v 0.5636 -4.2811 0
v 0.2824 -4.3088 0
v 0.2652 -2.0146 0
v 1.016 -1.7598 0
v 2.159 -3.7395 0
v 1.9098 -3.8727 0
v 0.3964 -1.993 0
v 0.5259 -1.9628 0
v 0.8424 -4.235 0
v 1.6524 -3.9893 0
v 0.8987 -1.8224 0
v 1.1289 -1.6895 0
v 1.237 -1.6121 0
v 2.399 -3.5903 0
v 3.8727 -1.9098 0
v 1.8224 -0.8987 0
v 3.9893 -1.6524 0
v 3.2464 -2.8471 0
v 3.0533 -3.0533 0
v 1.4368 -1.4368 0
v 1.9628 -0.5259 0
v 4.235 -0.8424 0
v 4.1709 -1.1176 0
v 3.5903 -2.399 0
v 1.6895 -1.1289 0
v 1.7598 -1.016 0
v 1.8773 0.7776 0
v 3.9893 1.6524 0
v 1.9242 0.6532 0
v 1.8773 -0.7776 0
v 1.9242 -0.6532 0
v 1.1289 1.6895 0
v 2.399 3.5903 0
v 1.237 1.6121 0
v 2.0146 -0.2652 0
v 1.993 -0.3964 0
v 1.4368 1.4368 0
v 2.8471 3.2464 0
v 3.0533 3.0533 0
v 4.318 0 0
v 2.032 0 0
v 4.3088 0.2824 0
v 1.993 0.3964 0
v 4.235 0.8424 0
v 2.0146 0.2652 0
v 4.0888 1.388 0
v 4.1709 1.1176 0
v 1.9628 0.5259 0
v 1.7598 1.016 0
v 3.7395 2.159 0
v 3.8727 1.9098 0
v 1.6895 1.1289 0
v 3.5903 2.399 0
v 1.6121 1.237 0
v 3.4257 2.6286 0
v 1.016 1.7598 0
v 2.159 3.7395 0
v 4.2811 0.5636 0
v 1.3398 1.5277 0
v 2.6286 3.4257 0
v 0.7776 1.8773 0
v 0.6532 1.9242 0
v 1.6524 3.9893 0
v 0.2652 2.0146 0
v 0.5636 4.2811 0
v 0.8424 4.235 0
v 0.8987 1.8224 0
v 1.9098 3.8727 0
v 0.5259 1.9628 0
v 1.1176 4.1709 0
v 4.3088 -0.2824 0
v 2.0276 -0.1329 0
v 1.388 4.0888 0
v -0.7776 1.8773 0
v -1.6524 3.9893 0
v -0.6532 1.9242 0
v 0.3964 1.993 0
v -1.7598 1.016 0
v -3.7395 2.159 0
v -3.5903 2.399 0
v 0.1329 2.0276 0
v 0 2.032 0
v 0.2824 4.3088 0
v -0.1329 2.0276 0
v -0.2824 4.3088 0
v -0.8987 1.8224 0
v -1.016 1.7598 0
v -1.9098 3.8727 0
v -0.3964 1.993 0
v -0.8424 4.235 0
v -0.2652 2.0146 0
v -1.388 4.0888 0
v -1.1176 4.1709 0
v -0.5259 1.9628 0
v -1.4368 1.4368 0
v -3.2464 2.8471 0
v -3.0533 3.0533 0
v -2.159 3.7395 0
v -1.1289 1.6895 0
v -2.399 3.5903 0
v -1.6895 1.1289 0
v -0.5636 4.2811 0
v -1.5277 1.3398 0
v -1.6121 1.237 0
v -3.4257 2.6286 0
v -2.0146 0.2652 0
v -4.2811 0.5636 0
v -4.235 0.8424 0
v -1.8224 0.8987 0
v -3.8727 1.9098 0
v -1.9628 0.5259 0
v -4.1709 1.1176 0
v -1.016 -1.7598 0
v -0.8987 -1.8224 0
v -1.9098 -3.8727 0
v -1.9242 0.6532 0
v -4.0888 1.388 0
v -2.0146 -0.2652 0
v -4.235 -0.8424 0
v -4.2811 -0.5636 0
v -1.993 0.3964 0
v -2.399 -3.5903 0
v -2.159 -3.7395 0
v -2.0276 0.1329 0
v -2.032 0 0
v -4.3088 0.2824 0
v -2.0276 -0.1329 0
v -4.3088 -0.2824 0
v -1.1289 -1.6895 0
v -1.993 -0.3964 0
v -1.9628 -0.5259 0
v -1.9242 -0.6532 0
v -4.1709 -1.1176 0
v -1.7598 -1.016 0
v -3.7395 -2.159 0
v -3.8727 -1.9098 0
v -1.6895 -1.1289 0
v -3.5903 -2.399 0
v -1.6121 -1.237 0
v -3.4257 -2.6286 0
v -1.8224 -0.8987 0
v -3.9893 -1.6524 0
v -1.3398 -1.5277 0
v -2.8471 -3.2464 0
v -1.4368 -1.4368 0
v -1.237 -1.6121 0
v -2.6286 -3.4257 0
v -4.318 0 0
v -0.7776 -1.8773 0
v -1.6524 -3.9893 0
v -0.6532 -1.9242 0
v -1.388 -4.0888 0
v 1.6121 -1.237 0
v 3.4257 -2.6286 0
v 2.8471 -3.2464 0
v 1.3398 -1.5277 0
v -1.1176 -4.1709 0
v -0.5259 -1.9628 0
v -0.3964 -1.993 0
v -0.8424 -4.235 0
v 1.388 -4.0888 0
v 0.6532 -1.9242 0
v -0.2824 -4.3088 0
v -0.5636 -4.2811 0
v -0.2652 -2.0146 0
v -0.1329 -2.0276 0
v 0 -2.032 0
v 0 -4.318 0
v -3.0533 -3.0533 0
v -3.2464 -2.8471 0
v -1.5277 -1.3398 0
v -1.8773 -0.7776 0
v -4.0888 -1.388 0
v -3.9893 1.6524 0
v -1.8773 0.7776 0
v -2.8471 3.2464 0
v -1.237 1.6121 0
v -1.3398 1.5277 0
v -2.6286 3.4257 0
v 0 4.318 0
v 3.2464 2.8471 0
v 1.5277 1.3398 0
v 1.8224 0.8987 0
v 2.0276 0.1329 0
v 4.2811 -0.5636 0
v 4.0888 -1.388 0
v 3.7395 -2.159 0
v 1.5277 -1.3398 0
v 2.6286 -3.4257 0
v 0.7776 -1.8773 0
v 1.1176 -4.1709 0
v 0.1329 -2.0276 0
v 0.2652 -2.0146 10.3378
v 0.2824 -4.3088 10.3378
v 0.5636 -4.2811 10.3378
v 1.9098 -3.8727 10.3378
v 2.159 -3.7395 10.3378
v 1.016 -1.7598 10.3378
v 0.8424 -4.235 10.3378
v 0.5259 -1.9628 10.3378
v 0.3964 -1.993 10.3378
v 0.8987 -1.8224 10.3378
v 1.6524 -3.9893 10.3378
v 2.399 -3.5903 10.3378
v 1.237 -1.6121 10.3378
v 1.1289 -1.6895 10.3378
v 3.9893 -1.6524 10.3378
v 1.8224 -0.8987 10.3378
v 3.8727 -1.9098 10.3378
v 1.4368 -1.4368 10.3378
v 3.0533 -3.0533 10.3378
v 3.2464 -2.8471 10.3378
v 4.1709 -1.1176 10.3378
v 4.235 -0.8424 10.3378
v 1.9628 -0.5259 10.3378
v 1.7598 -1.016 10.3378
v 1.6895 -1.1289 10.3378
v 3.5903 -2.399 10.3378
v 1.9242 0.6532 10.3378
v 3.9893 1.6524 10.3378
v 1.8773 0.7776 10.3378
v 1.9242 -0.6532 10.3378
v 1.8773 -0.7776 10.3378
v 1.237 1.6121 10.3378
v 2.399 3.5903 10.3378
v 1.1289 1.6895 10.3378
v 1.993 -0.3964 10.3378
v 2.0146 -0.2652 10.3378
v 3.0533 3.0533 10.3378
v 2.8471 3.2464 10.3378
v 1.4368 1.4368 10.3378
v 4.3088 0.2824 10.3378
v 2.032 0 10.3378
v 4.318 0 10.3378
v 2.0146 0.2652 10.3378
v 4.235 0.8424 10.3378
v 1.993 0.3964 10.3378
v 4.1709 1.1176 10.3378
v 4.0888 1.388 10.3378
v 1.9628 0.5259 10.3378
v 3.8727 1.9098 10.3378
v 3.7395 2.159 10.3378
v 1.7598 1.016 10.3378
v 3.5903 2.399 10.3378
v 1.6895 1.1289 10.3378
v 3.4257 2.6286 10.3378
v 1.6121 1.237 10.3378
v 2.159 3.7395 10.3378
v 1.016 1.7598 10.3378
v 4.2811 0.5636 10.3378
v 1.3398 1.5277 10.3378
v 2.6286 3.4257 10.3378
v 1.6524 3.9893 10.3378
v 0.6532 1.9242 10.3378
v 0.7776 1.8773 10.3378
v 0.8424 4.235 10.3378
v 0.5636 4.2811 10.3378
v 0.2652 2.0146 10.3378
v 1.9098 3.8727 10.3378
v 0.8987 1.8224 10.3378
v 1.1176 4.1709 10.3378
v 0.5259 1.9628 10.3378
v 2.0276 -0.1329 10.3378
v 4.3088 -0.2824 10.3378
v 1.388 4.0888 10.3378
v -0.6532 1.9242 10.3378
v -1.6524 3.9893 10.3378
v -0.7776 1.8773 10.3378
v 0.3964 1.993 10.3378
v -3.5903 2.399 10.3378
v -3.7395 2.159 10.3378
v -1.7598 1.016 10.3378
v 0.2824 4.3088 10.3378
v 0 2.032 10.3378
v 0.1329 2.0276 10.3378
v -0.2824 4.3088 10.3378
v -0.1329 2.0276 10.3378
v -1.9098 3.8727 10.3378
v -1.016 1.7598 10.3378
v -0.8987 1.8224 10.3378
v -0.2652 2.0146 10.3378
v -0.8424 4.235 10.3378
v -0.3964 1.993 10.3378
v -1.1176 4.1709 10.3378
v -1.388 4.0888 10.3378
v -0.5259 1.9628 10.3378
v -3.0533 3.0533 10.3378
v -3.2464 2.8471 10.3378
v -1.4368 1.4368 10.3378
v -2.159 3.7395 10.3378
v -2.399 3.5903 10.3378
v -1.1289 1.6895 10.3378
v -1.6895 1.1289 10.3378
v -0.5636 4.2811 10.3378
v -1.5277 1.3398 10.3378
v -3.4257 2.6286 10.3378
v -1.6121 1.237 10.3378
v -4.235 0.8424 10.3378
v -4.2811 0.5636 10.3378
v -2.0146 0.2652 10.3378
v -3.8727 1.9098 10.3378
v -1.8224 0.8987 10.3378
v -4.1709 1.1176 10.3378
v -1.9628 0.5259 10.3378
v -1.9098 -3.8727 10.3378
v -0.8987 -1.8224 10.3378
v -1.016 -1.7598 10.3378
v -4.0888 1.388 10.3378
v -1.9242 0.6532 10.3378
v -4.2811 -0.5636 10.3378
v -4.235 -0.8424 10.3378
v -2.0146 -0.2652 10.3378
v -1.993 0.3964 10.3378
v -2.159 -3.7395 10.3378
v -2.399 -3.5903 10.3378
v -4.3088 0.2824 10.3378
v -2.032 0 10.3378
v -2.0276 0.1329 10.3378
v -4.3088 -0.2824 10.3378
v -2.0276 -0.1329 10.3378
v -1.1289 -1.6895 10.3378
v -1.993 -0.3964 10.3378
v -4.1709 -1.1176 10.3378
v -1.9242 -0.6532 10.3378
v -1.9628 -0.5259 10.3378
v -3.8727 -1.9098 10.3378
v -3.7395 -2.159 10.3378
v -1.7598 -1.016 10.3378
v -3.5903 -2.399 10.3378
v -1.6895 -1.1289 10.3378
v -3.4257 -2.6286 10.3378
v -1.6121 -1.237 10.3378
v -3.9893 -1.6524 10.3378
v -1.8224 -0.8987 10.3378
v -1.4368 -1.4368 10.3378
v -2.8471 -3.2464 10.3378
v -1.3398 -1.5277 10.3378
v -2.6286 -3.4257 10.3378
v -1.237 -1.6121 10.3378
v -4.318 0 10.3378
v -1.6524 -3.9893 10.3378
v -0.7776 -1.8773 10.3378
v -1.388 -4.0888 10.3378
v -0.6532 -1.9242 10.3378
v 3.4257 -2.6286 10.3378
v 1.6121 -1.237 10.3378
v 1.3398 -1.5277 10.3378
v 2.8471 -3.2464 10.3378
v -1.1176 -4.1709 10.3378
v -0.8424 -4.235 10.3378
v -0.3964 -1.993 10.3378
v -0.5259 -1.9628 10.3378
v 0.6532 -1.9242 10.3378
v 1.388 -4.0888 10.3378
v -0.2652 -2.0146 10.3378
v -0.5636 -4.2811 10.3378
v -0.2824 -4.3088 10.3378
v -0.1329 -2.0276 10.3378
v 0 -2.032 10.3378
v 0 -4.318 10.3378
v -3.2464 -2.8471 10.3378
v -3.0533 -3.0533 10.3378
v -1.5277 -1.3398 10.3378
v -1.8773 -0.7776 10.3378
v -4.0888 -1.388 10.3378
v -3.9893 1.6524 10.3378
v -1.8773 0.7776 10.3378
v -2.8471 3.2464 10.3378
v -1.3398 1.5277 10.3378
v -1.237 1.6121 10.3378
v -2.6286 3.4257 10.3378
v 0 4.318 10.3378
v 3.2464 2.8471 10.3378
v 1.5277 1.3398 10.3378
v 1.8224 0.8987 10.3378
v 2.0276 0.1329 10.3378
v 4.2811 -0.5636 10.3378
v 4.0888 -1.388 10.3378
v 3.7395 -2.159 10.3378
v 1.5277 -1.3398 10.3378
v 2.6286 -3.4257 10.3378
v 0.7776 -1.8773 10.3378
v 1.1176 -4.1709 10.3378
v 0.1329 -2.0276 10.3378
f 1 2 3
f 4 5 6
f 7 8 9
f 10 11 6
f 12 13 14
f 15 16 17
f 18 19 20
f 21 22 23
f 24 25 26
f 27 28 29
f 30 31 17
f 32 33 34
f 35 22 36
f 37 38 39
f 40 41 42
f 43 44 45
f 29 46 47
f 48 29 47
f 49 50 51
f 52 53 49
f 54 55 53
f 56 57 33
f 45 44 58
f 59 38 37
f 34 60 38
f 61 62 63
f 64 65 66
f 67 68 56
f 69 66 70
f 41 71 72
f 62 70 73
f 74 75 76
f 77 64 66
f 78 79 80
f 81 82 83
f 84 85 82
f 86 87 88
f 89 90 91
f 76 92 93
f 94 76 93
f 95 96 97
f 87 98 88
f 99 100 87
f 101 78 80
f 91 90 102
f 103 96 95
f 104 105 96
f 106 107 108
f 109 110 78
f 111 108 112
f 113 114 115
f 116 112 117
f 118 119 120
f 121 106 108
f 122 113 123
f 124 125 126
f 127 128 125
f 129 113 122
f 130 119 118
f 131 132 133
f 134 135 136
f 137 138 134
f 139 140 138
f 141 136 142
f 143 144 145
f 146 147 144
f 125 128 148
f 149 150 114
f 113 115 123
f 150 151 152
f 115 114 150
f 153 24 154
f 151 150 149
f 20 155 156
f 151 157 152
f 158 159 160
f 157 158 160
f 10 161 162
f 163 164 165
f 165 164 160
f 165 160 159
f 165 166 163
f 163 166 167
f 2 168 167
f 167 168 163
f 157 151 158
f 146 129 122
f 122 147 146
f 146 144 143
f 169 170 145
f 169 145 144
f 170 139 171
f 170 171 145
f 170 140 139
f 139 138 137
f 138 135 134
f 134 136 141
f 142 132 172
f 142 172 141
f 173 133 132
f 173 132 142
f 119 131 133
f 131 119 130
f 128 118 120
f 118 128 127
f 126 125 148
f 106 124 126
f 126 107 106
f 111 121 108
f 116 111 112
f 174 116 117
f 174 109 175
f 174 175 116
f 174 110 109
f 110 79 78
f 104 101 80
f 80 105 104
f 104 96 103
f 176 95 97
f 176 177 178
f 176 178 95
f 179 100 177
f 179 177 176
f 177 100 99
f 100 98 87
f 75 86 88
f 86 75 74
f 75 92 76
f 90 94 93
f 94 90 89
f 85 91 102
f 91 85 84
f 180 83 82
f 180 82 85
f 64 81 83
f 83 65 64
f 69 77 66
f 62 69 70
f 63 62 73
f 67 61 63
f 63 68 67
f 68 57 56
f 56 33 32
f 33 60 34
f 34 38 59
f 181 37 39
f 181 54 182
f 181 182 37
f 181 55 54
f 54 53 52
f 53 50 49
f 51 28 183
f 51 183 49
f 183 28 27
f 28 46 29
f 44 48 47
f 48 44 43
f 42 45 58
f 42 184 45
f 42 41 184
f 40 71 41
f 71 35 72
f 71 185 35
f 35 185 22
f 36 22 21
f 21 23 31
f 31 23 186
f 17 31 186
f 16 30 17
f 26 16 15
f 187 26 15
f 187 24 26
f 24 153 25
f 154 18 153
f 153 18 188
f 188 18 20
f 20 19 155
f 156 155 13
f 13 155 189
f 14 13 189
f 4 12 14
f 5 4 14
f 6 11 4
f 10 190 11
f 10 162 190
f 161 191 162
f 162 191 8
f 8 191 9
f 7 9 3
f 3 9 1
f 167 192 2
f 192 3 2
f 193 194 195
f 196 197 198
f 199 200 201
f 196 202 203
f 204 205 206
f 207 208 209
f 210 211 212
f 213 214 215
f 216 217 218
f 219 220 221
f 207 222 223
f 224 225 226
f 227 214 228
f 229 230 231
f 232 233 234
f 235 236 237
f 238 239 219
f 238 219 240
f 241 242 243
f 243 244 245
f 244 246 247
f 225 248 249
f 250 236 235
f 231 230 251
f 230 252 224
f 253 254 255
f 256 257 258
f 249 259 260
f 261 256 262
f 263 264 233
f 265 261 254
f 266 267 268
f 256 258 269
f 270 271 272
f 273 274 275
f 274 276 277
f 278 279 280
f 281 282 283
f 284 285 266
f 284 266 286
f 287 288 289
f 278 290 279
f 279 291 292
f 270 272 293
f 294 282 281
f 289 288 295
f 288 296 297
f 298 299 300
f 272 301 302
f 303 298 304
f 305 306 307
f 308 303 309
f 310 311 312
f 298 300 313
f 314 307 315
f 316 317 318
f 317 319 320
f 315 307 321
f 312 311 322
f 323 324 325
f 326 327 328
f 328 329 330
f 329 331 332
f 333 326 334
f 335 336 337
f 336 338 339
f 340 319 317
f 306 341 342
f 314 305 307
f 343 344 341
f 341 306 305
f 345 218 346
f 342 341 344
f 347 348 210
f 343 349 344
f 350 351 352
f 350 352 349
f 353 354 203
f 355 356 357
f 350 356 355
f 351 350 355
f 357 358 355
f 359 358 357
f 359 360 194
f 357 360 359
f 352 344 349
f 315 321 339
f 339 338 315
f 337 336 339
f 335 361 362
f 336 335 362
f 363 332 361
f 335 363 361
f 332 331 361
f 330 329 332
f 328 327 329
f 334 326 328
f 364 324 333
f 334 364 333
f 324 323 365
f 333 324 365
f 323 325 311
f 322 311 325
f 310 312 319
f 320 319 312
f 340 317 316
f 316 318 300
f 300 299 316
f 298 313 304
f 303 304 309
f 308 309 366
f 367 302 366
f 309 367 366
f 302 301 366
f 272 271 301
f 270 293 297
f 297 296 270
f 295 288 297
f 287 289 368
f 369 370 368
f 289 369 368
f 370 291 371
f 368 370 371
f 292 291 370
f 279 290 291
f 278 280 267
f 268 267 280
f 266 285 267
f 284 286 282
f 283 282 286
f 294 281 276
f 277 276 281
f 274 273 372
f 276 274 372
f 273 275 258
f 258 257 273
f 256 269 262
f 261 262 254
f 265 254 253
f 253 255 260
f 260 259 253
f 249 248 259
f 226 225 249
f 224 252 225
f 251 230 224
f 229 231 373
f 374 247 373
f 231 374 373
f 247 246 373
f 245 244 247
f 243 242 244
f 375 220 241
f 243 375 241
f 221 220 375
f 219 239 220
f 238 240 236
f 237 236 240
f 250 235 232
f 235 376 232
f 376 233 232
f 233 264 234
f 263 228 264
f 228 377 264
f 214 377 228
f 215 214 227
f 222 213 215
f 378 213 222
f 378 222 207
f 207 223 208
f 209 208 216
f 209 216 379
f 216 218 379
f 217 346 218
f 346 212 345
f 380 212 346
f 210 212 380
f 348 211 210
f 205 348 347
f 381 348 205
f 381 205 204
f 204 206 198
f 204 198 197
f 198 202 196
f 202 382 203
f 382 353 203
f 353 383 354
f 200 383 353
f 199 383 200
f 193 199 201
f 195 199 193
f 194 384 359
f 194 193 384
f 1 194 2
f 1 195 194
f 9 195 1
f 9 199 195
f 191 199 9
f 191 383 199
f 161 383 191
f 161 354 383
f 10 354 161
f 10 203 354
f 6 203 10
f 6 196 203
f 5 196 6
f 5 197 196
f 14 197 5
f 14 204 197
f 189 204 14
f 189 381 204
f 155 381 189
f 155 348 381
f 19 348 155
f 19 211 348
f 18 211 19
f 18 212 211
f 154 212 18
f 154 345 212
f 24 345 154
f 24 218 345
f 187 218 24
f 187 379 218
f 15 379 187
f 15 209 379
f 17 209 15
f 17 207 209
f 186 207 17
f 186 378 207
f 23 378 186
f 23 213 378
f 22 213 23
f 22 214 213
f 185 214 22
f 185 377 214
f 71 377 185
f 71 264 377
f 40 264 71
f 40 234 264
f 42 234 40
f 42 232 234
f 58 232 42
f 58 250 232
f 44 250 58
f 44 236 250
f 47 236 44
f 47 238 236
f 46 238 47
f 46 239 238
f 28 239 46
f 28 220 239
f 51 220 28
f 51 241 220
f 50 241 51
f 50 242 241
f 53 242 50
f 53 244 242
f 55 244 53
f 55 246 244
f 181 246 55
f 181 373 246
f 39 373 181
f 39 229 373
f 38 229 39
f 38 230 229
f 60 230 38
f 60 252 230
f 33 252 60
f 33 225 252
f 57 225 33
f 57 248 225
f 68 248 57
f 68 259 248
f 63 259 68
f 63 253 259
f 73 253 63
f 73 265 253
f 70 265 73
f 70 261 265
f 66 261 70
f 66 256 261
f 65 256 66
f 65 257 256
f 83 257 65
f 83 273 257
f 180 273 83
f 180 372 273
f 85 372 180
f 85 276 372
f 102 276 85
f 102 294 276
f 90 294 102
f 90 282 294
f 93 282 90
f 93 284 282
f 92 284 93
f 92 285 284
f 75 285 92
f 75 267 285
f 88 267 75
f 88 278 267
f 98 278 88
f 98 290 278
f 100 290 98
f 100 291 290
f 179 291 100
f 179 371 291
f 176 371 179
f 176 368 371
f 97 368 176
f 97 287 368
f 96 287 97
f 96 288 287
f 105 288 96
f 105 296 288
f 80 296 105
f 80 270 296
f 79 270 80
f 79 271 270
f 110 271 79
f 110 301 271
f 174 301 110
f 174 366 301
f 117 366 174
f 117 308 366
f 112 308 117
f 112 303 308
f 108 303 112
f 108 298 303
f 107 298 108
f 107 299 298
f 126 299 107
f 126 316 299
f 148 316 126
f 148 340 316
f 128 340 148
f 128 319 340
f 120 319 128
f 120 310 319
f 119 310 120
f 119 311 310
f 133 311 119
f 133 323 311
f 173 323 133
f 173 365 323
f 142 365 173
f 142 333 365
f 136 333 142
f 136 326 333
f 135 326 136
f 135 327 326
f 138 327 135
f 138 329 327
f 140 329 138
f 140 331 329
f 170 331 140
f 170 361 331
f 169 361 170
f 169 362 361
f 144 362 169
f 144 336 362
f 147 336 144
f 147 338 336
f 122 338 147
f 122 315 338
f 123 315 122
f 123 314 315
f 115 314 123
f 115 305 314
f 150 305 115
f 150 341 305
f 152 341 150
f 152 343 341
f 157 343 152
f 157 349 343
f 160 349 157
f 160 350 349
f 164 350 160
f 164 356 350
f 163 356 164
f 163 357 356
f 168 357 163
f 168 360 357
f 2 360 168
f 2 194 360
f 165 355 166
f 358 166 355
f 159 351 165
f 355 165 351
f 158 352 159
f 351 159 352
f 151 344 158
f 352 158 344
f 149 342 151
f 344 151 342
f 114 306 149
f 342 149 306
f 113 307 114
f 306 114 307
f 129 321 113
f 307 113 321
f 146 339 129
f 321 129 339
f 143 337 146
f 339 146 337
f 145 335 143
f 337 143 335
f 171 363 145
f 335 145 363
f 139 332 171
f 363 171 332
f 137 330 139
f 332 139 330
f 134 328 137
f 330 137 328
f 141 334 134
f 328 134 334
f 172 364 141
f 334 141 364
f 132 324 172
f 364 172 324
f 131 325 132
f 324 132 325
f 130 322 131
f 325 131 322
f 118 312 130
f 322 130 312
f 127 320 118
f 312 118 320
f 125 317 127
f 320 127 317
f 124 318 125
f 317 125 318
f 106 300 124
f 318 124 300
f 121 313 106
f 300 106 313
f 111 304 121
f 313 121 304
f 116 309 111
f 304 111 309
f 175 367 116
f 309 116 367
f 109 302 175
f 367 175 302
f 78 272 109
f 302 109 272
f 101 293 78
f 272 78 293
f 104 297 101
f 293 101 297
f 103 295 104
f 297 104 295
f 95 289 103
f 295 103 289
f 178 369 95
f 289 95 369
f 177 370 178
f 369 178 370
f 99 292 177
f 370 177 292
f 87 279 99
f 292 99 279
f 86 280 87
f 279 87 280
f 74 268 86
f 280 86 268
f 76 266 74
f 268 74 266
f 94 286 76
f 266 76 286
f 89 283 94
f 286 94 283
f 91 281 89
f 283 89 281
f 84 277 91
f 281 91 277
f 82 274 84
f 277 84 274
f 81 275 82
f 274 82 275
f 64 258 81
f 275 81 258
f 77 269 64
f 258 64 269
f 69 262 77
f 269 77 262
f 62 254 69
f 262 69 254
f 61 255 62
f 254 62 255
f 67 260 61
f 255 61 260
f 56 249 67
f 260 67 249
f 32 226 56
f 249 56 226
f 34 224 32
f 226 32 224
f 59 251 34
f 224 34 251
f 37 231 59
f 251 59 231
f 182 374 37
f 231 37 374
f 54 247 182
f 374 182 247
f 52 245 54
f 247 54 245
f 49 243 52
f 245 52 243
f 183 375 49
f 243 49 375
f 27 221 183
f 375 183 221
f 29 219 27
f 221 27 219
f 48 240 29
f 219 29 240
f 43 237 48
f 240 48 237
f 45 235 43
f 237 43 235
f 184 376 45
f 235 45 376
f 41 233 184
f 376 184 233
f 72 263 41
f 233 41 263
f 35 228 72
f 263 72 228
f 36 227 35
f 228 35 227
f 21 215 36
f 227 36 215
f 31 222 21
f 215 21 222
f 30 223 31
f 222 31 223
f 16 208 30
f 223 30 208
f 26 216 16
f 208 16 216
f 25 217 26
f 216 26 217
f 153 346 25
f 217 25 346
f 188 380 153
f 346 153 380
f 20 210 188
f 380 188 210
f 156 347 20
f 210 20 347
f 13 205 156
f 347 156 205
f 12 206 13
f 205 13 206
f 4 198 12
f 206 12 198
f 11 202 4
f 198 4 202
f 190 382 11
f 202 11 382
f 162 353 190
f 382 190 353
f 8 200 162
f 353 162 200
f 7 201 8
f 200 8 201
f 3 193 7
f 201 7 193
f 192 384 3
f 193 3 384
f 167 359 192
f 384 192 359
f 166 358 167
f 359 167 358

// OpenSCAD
ViewScale = [0.0254, 0.0254, 0.0254];

scale(ViewScale)
{
    linear_extrude(407) 
    difference() {
        circle(170, $fn=96);
        circle(80, $fn=96);
    }
}
